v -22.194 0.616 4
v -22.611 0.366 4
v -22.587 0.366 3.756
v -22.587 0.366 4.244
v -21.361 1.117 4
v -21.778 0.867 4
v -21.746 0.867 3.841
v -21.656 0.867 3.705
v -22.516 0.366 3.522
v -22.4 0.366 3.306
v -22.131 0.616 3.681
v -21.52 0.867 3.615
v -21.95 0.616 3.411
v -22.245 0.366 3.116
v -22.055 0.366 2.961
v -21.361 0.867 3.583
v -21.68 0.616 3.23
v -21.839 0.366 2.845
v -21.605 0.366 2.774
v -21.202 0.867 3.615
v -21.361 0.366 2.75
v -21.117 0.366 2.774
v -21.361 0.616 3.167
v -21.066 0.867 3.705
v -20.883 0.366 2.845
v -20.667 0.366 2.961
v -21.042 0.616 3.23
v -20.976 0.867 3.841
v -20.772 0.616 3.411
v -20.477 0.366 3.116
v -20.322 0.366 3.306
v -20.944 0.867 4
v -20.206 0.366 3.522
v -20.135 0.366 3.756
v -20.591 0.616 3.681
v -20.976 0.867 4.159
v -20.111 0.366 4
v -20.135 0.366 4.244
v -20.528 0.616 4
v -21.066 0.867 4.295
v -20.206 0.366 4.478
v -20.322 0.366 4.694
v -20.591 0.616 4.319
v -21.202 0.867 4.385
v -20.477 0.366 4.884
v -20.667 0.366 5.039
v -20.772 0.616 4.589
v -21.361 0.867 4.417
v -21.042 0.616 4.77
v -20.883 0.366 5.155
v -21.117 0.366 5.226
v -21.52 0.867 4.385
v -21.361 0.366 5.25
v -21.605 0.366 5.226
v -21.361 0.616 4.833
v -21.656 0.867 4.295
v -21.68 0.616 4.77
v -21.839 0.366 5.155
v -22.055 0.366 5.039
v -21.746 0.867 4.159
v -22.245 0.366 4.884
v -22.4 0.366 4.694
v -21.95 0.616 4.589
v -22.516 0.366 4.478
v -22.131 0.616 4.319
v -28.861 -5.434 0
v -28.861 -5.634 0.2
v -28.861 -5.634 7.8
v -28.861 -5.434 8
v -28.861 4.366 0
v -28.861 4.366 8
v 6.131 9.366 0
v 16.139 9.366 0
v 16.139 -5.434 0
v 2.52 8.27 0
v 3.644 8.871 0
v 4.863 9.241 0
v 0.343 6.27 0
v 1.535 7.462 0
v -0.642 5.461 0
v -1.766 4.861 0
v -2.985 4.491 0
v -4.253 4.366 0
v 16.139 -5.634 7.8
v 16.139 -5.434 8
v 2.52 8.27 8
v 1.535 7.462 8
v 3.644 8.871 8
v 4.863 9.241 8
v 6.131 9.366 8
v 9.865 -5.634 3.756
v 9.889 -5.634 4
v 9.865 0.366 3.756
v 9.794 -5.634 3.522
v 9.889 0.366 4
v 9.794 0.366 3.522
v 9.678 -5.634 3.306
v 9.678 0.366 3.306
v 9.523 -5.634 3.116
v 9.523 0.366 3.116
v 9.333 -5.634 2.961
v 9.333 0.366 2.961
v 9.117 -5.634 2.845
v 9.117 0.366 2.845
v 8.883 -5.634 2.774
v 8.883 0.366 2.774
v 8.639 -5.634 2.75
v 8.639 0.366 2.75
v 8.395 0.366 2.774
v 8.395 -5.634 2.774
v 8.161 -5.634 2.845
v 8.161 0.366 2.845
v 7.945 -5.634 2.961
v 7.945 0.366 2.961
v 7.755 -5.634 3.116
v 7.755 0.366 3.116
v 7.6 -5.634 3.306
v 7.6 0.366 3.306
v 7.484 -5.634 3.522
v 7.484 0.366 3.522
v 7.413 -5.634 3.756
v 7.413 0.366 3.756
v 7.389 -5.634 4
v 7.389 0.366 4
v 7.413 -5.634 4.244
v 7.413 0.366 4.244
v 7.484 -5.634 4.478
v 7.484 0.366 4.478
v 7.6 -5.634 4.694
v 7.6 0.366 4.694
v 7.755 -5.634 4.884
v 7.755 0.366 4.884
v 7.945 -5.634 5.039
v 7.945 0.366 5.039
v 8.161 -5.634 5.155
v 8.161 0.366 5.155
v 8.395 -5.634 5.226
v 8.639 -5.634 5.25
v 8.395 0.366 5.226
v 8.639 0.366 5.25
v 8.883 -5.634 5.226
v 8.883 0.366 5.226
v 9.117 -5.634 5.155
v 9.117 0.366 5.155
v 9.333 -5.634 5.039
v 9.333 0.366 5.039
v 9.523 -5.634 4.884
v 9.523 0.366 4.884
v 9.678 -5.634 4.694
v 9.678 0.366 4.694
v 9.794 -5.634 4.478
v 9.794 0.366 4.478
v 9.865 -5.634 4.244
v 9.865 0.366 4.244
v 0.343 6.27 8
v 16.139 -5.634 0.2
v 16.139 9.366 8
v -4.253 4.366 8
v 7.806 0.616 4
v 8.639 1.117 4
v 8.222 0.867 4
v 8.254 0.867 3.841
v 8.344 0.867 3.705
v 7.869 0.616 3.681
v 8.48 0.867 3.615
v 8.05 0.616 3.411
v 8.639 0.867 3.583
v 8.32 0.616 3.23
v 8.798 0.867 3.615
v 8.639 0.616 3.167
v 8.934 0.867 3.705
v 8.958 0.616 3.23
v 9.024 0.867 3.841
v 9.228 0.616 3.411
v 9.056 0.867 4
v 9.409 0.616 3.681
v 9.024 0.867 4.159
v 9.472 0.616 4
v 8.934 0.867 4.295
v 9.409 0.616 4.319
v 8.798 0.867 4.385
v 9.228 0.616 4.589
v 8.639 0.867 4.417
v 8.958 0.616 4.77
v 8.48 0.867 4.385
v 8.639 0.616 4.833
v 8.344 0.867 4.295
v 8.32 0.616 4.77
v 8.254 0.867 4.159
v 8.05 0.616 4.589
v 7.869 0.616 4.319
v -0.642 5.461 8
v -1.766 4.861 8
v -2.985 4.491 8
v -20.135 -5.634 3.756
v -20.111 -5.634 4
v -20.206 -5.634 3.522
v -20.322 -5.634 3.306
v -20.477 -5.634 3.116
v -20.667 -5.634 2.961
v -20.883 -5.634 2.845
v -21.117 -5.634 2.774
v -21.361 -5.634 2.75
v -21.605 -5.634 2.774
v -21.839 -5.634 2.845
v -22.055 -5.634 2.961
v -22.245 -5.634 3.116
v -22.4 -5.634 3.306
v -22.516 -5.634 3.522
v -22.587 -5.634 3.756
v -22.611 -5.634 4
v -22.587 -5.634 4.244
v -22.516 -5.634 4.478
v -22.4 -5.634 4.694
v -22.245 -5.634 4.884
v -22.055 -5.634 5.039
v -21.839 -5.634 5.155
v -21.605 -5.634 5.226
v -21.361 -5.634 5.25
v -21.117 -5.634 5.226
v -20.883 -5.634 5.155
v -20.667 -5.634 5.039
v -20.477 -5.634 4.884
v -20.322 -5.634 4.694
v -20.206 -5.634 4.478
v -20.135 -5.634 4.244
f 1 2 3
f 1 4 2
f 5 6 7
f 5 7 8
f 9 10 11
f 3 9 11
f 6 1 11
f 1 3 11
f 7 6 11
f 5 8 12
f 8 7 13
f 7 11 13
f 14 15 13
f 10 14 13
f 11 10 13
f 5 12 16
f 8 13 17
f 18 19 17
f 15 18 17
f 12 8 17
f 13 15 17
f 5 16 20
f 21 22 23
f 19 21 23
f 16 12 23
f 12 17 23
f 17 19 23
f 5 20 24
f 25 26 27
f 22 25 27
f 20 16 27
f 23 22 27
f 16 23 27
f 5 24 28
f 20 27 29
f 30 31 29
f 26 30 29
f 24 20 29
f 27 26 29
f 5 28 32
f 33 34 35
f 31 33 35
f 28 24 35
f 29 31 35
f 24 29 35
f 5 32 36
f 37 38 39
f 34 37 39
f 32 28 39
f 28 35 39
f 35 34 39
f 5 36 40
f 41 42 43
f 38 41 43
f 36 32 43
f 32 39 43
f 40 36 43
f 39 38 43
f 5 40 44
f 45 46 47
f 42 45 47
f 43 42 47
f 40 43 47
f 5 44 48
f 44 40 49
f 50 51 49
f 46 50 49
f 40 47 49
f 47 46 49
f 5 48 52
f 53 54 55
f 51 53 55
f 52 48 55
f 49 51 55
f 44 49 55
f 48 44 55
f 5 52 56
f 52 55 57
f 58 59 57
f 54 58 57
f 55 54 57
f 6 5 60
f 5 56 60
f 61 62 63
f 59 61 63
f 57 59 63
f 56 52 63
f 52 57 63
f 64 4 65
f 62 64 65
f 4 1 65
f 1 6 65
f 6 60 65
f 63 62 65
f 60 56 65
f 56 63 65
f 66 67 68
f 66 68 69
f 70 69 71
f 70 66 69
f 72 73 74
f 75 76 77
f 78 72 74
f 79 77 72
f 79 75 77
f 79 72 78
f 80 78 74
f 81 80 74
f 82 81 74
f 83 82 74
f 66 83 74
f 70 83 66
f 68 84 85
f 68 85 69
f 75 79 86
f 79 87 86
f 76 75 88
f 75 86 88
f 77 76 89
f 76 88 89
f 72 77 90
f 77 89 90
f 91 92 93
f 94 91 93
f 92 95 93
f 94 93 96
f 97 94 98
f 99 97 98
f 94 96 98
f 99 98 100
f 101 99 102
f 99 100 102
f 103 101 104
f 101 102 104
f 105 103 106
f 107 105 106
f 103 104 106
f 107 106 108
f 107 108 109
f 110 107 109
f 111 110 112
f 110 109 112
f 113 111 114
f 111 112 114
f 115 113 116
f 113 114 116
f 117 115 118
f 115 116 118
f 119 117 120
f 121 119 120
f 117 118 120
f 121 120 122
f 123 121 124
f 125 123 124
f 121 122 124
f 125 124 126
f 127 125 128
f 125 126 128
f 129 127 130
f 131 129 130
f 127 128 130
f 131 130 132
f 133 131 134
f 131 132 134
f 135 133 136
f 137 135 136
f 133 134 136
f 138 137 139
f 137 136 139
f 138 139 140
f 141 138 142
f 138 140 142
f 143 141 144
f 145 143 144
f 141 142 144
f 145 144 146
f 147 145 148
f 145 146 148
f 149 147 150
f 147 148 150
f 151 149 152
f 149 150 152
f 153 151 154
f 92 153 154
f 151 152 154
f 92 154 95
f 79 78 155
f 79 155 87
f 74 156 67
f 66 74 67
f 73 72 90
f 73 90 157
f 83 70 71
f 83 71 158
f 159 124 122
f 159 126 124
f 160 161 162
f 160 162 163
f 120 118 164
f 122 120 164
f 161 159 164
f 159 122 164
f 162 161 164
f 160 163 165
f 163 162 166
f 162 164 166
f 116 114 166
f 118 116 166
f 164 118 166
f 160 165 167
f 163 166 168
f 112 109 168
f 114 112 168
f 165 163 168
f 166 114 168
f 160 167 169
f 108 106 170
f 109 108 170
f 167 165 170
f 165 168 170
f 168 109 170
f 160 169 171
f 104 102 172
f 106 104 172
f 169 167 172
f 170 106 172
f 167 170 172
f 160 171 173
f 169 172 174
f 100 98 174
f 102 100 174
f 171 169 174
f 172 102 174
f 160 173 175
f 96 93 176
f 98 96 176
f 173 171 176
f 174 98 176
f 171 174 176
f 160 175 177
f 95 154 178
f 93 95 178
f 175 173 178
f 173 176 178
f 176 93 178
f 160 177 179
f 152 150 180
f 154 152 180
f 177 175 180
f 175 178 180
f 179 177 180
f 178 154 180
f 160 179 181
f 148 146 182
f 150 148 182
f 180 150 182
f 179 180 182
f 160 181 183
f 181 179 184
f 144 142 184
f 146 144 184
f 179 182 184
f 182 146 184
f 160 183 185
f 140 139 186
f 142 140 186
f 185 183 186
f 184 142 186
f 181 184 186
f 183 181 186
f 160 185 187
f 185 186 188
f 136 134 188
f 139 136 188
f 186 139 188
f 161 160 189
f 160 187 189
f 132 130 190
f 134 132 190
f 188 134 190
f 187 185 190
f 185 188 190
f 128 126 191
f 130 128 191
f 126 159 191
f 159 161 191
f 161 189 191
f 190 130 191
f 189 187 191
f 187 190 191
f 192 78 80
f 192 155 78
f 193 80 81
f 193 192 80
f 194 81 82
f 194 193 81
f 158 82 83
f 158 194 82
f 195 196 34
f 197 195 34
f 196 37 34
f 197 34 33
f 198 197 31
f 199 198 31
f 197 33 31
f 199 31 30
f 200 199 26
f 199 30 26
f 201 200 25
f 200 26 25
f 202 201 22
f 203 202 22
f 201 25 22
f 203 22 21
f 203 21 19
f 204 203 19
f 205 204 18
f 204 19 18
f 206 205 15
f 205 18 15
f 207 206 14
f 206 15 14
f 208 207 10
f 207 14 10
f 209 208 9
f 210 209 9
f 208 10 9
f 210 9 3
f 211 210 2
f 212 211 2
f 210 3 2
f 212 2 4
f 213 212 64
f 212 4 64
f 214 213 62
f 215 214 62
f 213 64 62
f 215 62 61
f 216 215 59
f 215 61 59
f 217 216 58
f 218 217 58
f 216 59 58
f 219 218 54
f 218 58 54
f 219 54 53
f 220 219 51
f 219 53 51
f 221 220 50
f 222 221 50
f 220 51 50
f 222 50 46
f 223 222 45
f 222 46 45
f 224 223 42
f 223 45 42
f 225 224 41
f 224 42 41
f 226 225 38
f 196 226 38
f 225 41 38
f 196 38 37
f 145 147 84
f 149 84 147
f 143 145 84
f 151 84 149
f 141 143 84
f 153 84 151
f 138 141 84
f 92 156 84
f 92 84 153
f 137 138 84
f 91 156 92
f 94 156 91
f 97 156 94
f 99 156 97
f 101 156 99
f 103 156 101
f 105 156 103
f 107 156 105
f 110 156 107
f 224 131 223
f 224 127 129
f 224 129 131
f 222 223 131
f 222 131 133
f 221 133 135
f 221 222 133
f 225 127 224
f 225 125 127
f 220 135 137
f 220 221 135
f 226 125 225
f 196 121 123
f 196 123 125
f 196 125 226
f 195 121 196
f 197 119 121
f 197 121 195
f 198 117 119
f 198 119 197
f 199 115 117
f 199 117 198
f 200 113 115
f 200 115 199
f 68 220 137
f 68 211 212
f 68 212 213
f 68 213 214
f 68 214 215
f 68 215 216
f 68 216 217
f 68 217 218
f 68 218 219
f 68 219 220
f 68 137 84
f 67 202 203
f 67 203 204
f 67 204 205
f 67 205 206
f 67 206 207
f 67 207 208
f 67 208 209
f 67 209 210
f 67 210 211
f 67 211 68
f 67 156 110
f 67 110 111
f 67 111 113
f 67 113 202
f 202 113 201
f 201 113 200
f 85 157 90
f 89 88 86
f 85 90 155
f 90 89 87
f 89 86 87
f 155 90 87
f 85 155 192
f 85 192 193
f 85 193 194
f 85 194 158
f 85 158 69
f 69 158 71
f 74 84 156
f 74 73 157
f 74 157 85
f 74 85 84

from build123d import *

# Parameters (mm, degrees)
BOSS_EXTRUDE1_DEPTH   = 8
FILLET1_R             = 6.5
CHAMFER1_SIZE         = 0.2
M3_TAPPED_HOLE1_D     = 2.5
M3_TAPPED_HOLE1_DEPTH = 6
M3_TAPPED_HOLE1_TIP   = 0.751075774


with BuildPart() as part:
    # Sketch1 → Boss-Extrude1 (new body)
    with BuildSketch(Plane.XY):
        Polygon((-1.56097561, 4.365853659), (3.43902439, 9.365853659), (16.13902439, 9.365853659), (16.13902439, -5.634146341), (-28.86097561, -5.634146341), (-28.86097561, 4.365853659), align=None)
    extrude(amount=BOSS_EXTRUDE1_DEPTH)

    # Fillet1
    fillet1_edges = [part.edges().sort_by_distance(p)[0] for p in [
        (-1.56097561, 4.365853659, 4),
        (3.43902439, 9.365853659, 4),
    ]]
    fillet(fillet1_edges, radius=FILLET1_R)

    # Chamfer1
    chamfer1_edges = [part.edges().sort_by_distance(p)[0] for p in [
        (-6.36097561, -5.634146341, 8),
        (-6.36097561, -5.634146341, 0),
    ]]
    chamfer(chamfer1_edges, length=CHAMFER1_SIZE)

    # M3 Tapped Hole1
    with Locations(Plane(origin=(0, -5.634146341, 0), x_dir=(-1, 0, 0), z_dir=(0, -1, 0))):
        with Locations((21.36097561, -4), (-8.63902439, -4)):
            Hole(M3_TAPPED_HOLE1_D / 2, depth=M3_TAPPED_HOLE1_DEPTH)
            with Locations((0, 0, -(M3_TAPPED_HOLE1_DEPTH + M3_TAPPED_HOLE1_TIP / 2))):  # 118° drill point
                Cone(0, M3_TAPPED_HOLE1_D / 2, M3_TAPPED_HOLE1_TIP, mode=Mode.SUBTRACT)


solid = part.part
